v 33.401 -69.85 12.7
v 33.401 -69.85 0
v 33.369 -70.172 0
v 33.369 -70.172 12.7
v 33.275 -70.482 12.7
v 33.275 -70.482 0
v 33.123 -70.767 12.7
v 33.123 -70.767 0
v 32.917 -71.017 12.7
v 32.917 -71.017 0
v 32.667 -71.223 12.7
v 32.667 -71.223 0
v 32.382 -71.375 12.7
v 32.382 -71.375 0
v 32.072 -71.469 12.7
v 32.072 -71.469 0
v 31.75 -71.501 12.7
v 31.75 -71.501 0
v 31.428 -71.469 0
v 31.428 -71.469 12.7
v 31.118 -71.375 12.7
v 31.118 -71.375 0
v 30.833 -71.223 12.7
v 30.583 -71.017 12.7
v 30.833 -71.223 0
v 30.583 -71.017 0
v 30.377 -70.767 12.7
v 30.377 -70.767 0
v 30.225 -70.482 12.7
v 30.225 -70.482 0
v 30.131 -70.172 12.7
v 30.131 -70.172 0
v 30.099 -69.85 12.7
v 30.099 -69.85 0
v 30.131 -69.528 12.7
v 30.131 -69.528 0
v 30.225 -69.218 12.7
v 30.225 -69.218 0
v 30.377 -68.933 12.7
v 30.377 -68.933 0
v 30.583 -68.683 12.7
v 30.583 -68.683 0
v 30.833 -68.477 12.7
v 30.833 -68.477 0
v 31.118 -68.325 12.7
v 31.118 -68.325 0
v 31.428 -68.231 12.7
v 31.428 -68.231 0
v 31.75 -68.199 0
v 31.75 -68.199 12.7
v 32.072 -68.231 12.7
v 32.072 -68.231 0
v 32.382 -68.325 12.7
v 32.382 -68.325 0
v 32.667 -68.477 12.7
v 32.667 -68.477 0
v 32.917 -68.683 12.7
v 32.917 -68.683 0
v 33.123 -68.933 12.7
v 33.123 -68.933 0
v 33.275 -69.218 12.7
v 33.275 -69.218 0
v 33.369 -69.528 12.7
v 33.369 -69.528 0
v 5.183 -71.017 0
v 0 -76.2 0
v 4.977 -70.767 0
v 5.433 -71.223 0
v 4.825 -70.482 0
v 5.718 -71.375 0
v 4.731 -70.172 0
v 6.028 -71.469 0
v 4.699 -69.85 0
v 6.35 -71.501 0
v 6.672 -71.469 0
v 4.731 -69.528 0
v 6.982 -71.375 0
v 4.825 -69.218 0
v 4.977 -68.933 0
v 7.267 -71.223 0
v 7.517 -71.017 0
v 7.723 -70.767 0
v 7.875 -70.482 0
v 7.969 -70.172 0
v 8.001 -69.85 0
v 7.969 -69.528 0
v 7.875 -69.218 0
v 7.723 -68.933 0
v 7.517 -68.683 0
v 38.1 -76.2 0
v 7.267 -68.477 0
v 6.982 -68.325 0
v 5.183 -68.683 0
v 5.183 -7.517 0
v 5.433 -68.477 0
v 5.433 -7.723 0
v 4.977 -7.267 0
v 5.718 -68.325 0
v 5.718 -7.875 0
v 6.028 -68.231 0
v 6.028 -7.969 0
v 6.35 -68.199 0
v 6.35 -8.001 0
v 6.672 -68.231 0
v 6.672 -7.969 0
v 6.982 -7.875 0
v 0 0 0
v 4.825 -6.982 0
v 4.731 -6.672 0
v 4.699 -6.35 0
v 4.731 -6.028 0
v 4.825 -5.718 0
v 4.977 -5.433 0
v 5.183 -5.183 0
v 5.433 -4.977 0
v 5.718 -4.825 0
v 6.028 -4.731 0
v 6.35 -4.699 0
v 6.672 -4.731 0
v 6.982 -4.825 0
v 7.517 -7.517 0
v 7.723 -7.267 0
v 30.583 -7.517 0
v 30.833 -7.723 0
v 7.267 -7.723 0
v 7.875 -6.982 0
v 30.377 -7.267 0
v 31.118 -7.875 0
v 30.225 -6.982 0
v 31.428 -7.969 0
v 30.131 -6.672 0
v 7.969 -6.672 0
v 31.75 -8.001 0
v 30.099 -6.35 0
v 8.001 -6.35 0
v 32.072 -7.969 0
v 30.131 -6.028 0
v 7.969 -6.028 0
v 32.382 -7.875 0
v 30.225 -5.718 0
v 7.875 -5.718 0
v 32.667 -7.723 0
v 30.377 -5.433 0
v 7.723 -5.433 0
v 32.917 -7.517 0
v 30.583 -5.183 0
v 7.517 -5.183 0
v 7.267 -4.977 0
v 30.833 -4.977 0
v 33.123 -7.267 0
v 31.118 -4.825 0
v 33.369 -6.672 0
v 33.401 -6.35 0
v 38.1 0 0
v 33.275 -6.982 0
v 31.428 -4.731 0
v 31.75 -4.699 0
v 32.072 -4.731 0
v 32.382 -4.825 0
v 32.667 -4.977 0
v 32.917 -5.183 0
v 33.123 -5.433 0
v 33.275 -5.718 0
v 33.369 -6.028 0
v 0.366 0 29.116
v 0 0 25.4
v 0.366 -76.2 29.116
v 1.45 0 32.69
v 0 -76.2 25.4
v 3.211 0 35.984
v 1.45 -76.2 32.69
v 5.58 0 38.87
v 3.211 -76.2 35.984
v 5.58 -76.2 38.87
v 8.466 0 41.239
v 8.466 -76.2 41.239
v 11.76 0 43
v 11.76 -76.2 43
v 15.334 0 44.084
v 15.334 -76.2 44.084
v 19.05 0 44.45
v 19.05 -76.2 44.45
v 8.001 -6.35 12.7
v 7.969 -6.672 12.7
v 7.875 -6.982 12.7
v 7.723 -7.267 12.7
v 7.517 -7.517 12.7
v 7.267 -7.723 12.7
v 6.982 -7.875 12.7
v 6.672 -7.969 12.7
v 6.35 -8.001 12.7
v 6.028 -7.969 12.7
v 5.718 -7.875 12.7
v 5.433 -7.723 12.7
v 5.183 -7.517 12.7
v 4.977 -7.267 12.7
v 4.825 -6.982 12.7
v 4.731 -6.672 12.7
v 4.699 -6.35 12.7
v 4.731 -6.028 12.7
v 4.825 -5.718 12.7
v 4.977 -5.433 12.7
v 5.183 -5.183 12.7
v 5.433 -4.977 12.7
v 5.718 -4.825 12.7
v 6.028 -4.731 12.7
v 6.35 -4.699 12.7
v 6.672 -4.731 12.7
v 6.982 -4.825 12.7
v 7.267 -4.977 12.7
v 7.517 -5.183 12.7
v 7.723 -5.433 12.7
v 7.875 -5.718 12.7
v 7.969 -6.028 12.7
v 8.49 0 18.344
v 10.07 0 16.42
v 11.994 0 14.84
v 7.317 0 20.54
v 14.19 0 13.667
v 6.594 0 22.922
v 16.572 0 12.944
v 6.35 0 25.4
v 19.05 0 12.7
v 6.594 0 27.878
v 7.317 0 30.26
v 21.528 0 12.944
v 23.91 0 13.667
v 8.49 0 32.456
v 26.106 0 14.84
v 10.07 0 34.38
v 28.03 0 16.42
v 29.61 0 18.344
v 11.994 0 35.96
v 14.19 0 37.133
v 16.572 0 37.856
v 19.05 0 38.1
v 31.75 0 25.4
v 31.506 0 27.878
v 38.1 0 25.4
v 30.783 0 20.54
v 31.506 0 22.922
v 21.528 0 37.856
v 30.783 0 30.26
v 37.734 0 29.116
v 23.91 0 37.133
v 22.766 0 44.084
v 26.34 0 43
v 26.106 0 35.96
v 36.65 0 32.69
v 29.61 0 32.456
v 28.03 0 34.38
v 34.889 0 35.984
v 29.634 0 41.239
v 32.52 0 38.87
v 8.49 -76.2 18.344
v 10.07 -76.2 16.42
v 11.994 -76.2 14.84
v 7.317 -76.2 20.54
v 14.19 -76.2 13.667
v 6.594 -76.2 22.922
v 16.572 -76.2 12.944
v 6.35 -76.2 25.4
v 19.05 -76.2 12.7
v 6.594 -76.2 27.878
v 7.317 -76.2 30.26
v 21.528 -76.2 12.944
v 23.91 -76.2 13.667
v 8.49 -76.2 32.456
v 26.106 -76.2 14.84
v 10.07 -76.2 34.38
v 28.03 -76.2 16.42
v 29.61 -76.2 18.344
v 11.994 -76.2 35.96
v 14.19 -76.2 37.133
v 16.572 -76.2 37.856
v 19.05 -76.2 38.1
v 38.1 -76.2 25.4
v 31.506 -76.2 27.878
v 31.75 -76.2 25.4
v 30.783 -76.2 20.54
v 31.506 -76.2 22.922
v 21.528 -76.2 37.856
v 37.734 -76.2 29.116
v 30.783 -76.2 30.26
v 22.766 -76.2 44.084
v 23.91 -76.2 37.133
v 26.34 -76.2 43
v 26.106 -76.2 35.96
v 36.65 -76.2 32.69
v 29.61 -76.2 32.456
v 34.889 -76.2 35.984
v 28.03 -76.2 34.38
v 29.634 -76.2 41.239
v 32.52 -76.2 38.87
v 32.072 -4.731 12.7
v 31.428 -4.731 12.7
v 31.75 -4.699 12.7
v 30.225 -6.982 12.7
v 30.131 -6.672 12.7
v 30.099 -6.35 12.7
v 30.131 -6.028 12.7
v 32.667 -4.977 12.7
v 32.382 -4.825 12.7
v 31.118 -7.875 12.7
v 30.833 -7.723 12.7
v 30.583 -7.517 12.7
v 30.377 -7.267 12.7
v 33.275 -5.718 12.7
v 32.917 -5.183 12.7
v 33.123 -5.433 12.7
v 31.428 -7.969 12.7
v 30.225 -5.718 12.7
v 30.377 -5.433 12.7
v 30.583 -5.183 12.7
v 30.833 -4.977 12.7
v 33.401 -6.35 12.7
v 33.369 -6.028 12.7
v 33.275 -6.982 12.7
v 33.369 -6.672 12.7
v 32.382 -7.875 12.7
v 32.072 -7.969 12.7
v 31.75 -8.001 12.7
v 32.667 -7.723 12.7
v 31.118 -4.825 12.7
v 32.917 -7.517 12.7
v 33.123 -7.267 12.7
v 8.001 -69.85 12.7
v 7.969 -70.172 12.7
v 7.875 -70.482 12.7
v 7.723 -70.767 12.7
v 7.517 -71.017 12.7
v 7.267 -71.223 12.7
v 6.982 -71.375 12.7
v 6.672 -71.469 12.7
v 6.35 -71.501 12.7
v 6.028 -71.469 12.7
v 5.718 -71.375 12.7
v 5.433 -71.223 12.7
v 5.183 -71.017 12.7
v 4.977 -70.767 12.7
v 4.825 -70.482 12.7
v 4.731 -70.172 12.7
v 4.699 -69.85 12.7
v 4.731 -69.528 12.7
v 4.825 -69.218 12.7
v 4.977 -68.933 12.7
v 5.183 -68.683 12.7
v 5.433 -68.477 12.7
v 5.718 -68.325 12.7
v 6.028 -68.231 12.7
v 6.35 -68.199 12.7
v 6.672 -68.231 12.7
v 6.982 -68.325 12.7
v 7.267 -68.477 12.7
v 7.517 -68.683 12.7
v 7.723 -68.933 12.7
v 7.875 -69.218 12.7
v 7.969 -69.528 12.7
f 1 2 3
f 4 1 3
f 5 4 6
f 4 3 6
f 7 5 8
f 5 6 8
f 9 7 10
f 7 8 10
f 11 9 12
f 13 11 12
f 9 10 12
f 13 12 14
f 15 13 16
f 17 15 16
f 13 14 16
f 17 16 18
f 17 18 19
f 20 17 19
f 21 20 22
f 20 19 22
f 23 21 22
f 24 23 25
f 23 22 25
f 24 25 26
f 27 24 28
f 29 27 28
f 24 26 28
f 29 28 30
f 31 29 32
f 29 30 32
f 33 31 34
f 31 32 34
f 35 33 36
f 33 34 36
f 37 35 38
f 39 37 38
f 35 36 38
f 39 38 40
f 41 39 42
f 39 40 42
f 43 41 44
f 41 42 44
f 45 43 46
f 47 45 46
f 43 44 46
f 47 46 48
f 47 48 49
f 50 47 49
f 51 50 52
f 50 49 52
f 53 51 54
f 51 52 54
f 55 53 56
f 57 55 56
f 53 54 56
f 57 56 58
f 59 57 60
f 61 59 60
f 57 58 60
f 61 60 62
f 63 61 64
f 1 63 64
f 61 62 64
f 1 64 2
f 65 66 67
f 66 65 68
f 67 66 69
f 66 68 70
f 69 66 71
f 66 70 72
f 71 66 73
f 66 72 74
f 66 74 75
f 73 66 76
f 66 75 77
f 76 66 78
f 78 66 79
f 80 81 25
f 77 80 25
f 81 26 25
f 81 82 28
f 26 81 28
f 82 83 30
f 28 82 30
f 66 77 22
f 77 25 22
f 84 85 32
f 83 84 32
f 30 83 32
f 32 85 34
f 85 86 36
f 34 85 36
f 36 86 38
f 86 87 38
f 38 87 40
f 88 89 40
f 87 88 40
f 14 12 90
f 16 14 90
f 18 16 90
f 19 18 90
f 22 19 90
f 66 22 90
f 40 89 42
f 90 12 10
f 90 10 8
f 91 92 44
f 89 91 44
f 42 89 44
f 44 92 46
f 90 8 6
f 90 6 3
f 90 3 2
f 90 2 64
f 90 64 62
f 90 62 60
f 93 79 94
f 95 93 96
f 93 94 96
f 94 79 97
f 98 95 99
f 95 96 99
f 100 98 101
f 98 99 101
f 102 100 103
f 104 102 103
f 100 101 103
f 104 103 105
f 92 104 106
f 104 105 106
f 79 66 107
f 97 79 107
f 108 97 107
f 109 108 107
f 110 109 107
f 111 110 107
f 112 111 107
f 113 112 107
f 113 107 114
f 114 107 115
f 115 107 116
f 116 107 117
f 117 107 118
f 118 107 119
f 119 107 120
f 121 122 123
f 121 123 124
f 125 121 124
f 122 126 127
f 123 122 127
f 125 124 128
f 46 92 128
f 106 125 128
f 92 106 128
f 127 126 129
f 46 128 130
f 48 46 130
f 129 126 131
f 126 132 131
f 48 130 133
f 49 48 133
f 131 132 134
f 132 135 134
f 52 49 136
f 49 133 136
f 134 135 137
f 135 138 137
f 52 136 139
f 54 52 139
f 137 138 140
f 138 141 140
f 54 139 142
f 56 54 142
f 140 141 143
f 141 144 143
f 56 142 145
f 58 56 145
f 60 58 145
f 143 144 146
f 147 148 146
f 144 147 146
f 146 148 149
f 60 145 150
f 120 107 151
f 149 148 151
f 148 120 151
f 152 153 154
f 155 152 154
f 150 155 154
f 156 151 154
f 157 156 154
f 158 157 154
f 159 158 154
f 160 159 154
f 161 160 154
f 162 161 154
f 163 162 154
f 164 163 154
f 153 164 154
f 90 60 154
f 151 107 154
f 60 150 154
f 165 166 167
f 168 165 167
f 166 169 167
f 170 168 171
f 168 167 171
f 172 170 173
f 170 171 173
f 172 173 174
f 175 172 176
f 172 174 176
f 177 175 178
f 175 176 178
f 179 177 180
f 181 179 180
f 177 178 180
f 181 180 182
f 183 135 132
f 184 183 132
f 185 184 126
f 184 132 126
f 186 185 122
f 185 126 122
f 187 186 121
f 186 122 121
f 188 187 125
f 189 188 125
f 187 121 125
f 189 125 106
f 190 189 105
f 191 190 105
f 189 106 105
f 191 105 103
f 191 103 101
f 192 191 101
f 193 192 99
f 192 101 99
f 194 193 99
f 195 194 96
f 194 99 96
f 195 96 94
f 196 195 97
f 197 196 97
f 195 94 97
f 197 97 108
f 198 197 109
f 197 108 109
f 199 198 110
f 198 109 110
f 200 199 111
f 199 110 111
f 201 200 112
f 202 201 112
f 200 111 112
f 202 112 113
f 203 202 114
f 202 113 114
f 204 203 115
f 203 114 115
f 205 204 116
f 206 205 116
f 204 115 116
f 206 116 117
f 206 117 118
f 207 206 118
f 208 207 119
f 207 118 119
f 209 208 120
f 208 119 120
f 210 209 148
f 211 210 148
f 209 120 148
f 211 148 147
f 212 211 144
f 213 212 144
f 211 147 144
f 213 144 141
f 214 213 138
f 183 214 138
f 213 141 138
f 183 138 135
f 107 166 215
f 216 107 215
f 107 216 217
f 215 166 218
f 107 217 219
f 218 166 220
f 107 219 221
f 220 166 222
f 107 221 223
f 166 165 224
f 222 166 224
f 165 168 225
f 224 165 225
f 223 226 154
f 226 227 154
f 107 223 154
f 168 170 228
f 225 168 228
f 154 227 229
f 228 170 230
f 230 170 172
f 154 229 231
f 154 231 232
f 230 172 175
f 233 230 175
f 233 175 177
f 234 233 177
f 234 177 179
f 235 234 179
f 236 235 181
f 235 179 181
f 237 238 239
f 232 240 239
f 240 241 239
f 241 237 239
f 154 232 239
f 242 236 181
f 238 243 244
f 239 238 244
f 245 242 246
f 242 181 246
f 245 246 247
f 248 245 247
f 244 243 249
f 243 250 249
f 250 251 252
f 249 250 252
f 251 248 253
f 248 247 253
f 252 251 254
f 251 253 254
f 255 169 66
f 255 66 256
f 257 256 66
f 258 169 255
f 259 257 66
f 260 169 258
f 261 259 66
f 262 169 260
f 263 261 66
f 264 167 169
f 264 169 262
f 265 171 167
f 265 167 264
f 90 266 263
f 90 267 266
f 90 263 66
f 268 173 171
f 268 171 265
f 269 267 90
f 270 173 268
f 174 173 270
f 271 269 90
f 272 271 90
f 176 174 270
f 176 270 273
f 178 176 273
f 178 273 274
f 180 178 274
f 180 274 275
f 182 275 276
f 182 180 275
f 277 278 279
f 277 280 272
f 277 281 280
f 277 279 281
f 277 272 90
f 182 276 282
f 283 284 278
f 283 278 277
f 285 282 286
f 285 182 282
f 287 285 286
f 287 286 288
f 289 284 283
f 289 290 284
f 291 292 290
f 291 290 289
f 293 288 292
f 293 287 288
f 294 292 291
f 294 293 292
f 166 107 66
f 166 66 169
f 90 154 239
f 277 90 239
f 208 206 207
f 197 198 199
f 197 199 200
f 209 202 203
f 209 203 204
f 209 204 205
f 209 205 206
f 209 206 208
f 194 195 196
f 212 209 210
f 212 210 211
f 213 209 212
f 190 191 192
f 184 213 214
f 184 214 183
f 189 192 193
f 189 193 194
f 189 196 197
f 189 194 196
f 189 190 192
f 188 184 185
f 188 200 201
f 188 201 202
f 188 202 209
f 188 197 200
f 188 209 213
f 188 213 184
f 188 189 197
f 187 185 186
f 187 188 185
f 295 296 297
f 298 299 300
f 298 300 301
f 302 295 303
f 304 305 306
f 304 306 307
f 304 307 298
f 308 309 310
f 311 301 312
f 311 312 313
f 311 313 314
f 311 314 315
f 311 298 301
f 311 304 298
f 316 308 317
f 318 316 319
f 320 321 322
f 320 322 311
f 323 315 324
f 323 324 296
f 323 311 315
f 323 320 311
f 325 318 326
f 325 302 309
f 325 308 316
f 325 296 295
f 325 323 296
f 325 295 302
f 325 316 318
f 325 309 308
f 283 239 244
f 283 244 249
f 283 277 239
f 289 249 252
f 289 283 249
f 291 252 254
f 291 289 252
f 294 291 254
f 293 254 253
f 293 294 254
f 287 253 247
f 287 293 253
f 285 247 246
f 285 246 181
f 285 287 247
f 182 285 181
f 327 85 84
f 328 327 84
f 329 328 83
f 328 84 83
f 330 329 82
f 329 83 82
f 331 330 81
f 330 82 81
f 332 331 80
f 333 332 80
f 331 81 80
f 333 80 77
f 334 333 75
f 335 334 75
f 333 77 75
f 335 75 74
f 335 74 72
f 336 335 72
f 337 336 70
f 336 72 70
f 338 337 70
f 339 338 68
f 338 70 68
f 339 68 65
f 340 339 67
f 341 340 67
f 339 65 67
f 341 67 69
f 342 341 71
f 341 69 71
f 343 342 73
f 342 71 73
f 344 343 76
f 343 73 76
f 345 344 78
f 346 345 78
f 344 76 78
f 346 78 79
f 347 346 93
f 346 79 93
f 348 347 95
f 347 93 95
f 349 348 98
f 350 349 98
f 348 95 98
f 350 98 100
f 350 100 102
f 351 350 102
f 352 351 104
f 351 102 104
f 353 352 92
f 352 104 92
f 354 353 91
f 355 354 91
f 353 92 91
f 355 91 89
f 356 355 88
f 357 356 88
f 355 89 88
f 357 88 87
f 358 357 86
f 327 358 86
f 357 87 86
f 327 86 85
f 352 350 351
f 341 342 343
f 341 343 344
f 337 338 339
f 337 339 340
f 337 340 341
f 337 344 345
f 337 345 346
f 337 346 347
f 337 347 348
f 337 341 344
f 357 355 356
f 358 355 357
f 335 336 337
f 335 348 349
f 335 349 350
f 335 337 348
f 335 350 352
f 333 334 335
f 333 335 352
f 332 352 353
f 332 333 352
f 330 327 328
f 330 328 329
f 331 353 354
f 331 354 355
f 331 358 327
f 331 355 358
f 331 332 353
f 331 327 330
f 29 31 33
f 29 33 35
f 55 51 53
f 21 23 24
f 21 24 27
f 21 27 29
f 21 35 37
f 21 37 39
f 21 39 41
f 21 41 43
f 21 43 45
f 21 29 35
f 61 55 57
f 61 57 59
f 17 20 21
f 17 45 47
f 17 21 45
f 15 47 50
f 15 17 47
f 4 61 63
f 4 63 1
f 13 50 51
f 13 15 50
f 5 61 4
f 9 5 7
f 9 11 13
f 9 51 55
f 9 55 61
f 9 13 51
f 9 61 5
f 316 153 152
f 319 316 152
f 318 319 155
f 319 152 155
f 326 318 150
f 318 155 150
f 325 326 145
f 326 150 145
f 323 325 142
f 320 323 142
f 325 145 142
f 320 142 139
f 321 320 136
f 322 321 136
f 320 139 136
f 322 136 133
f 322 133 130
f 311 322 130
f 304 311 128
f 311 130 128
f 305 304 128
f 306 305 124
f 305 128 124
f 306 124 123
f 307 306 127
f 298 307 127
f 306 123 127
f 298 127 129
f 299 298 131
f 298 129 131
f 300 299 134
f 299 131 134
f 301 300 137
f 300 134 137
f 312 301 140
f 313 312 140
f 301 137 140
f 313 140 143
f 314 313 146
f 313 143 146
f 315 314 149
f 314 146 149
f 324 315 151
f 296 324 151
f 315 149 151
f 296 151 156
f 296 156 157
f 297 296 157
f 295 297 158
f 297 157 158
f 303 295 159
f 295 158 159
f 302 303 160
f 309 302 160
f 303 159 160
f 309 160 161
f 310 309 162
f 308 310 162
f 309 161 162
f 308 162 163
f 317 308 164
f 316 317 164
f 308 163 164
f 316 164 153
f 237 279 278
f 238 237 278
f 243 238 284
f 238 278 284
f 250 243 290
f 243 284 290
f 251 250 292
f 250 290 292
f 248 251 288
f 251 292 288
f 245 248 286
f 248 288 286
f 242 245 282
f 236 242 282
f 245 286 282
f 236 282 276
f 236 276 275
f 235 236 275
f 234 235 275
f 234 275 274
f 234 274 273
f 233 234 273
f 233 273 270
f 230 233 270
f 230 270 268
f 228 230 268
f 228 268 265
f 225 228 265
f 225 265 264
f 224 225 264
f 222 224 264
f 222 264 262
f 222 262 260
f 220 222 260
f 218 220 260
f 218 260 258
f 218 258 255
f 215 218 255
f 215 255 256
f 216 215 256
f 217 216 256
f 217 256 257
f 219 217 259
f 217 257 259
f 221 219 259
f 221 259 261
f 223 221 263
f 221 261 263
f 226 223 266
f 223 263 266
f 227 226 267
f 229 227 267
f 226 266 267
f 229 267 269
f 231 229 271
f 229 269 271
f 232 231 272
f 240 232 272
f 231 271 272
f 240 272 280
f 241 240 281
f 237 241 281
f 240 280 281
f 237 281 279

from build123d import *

# Parameters (mm, degrees)
F0_W     = 38.1
F0_H     = 44.45
F1_DEPTH = 76.2
F2_R     = 19.04999
F3_R     = 12.7
F4_DEPTH = 76.201
F5_R     = 1.651
F6_DEPTH = 12.7


# Not quite as in the source:
# - a fillet or chamfer is up to 0.001 mm smaller than in the source, because OpenCascade refuses the exact size


with BuildPart() as f1:
    # F0 (on Front) → F1 (new body)
    with BuildSketch(Plane.XZ):
        with Locations((19.05, 22.225)):
            Rectangle(F0_W, F0_H)
    extrude(amount=F1_DEPTH)

    # F2 (radius 19.05 in the source; OpenCascade refuses exactly that, so slightly less here)
    f2_edges = [f1.edges().sort_by_distance(p)[0] for p in [
        (0, -38.1, 44.45),
        (38.1, -38.1, 44.45),
    ]]
    fillet(f2_edges, radius=F2_R)

    # F3 (on face) → F4 (cut, through all)
    with BuildSketch(Plane.XZ.offset(76.2)):
        with Locations((19.05, 25.4)):
            Circle(F3_R)
    extrude(amount=-F4_DEPTH, mode=Mode.SUBTRACT)

    # F5 (on face) → F6 (cut)
    with BuildSketch(Plane(origin=(0, 0, 0), x_dir=(1, 0, 0), z_dir=(0, 0, -1))):
        with Locations((31.75, 69.85)):
            Circle(F5_R)
        with Locations((6.35, 69.85)):
            Circle(F5_R)
        with Locations((31.75, 6.35)):
            Circle(F5_R)
        with Locations((6.35, 6.35)):
            Circle(F5_R)
    extrude(amount=-F6_DEPTH, mode=Mode.SUBTRACT)


solid = f1.part
